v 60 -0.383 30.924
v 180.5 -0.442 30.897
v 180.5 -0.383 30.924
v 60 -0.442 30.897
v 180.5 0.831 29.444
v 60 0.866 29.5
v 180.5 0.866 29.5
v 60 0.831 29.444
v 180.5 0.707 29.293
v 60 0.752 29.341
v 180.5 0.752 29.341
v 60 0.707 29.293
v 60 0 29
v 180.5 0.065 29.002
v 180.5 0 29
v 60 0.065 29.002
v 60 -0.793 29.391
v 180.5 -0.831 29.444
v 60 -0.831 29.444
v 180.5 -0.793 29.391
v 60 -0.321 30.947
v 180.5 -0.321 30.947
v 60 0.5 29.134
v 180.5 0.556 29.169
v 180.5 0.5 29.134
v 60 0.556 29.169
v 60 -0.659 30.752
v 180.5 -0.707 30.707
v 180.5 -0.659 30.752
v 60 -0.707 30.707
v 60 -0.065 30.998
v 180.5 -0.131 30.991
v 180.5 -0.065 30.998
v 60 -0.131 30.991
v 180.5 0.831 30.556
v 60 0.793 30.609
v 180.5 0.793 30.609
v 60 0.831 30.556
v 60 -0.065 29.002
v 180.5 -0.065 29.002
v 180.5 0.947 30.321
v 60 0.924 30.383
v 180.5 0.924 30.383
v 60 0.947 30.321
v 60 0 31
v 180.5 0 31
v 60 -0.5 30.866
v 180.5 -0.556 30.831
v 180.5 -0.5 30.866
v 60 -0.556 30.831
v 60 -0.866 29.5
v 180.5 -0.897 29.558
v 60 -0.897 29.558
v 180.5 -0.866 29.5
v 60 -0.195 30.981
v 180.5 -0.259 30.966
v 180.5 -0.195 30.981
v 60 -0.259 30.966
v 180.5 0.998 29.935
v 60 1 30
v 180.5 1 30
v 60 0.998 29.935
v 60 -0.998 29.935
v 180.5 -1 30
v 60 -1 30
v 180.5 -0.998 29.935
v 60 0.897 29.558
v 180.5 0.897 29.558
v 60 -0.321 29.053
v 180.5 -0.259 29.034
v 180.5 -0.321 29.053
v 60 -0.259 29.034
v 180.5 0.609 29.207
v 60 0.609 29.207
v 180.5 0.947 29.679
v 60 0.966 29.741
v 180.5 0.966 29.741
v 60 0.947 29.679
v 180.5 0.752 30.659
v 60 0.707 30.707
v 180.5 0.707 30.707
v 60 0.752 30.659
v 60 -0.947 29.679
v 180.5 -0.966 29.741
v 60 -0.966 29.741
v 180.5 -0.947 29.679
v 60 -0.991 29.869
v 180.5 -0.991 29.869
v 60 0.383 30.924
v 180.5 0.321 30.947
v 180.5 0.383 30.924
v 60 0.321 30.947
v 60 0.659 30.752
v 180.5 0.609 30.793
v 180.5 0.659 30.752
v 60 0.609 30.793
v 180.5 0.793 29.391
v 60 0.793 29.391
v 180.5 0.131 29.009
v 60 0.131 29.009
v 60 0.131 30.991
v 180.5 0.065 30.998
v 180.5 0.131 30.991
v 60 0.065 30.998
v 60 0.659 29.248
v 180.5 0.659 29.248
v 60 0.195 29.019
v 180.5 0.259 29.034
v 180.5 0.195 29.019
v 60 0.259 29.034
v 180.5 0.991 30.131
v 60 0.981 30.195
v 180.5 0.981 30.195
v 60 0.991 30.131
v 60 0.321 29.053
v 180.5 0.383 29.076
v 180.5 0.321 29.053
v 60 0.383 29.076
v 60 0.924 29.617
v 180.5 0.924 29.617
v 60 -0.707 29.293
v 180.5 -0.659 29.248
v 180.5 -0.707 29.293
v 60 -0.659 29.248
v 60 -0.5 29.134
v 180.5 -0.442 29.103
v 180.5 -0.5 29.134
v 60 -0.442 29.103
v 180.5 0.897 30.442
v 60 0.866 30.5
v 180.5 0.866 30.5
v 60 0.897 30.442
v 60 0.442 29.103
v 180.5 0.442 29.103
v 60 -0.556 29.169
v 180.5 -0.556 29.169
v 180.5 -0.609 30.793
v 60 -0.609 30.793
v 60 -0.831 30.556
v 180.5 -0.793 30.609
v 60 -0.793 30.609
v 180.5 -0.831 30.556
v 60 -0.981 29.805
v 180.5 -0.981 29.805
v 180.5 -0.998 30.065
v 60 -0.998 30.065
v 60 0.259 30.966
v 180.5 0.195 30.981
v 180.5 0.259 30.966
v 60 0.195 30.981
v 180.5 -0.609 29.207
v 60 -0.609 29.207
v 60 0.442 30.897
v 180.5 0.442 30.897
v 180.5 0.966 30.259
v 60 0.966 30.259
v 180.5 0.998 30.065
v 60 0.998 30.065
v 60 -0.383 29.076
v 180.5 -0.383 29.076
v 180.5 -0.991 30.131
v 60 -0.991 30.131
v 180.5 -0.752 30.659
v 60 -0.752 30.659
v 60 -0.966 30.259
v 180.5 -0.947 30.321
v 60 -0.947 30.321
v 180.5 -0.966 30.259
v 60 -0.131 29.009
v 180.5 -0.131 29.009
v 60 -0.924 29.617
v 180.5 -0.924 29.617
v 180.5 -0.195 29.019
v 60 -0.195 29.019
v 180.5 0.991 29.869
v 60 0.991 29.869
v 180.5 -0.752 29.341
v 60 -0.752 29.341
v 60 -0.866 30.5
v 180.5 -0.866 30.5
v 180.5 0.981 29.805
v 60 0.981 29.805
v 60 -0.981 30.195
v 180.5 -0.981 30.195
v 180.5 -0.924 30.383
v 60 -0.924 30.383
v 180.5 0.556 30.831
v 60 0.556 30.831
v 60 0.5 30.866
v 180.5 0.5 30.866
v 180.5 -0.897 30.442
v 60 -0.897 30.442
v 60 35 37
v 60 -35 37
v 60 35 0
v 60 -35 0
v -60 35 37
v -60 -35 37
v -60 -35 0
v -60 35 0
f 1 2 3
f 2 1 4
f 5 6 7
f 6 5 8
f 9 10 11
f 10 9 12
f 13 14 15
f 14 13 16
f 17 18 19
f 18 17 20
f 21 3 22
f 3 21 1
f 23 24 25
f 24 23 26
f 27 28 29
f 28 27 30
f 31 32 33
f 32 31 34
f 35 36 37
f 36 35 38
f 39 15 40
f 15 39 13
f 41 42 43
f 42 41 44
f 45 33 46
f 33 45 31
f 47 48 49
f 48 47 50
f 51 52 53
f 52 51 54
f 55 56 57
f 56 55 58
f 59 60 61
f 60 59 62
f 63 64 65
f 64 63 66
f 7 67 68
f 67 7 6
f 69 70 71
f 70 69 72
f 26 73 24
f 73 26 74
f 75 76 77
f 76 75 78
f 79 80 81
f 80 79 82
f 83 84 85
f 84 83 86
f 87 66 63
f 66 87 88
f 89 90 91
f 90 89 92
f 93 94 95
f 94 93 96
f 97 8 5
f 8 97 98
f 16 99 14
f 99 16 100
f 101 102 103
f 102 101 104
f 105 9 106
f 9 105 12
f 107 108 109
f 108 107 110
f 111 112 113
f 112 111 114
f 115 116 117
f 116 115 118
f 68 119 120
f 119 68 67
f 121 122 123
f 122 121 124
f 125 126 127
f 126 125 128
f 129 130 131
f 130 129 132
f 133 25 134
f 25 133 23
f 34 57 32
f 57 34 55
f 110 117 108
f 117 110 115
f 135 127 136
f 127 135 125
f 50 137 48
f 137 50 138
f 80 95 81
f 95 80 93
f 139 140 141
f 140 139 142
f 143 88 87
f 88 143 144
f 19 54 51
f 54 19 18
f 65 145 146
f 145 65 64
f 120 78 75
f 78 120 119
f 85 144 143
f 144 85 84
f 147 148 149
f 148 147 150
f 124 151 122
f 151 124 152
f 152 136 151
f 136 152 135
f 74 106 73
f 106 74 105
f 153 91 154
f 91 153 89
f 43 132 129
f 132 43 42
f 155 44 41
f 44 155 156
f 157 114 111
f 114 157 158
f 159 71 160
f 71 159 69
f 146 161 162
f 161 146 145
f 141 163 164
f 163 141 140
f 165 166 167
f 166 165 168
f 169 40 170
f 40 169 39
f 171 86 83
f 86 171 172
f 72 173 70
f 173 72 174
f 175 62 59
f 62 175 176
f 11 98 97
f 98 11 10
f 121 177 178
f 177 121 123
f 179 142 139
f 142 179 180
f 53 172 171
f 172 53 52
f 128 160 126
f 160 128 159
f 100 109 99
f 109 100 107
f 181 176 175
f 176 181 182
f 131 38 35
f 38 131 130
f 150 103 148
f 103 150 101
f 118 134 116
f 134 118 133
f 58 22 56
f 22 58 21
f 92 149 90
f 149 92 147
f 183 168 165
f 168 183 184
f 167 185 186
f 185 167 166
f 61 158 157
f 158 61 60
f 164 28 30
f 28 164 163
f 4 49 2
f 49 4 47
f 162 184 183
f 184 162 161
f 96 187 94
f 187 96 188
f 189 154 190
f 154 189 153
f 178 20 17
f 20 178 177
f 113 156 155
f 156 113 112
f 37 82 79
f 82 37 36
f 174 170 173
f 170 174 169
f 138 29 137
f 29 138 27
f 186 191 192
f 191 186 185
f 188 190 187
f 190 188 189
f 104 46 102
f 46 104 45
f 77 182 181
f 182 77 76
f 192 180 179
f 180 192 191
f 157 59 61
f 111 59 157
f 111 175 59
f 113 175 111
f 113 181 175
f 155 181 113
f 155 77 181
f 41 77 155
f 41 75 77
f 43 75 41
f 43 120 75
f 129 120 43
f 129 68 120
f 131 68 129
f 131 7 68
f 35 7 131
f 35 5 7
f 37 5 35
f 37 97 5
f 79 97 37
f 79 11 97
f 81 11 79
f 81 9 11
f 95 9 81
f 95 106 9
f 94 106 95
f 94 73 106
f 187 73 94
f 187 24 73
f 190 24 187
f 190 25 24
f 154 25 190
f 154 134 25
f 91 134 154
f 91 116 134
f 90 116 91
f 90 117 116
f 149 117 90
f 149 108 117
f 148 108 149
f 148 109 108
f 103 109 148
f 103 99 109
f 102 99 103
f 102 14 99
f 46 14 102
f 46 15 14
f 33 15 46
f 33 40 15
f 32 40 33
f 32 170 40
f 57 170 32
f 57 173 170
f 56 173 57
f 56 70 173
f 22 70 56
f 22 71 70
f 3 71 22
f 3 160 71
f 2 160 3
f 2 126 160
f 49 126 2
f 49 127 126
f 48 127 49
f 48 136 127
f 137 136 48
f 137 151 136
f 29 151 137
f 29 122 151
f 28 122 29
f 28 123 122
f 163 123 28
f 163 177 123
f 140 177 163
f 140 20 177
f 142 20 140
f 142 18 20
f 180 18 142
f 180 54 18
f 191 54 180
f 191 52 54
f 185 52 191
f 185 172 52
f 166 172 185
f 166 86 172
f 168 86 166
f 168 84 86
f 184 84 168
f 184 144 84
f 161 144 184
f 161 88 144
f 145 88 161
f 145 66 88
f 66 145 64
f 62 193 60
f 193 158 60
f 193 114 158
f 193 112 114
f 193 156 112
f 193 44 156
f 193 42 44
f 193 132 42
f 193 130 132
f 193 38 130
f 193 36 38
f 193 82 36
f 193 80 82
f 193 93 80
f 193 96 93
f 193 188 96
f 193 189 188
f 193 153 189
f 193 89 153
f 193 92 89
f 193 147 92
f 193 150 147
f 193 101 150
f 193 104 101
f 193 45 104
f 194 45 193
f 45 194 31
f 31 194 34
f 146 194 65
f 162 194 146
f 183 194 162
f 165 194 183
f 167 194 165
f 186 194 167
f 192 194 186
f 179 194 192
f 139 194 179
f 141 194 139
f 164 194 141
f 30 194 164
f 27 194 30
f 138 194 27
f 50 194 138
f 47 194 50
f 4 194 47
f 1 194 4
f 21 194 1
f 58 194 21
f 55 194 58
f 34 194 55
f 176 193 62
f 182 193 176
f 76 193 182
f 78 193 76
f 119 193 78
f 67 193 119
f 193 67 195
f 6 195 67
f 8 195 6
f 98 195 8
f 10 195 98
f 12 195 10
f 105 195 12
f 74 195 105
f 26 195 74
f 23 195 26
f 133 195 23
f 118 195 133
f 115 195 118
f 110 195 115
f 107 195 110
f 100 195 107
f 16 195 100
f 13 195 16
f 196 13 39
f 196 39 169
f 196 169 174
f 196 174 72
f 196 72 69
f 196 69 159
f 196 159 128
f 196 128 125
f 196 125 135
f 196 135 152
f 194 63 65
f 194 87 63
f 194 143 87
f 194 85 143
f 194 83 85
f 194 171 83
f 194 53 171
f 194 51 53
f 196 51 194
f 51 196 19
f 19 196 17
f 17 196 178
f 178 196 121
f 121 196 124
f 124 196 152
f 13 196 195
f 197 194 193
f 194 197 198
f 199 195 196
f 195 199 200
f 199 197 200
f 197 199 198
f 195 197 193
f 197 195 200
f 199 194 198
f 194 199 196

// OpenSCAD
// Mini horizontal gel-electrophoresis box - buffer tank
// Print orientation: tank rests on XY plane (z = 0), builds upward (+Z)

// ---------------- Parameters ----------------
outer_x   = 120;   // outer length in X (mm)
outer_y   = 70;    // outer width in Y (mm)
outer_z   = 40;    // outer height in Z (mm)

wall      = 3;     // wall thickness (mm)
floor     = 3;     // floor thickness (mm)

platform_x = 60;   // platform length in X (mm), centred
platform_top_z = 13; // height of platform top above inner floor (mm)

hole_d    = 2;     // electrode hole diameter (mm)
hole_y    = 0;     // hole centre Y position (mm)
hole_z    = 30;    // hole centre Z position (mm)

eps       = 0.5;   // cutter overshoot past faces (mm)
$fn       = 96;    // curve resolution

// ---------------- Derived ----------------
inner_x = outer_x - 2*wall;   // 114 mm
inner_y = outer_y - 2*wall;   // 64 mm
inner_floor_z = floor;        // 3 mm (inner floor lies on z = floor)

platform_bottom_z = inner_floor_z;        // platform bottom at inner floor level
// platform height = platform_top_z - inner_floor_z = 10 mm

// ---------------- Model ----------------
union() {
    // Main tank body (open top)
    translate([-outer_x/2, -outer_y/2, 0])
        cube([outer_x, outer_y, outer_z - floor]);

    // Raised gel-tray platform, centred in X, spanning full Y
    translate([-outer_x/2, -outer_y/2, platform_bottom_z])
        cube([platform_x, outer_y, platform_top_z - inner_floor_z]);

    // Electrode holes through each end wall, along X
    for (sx = [-1, 1])
        translate([sx > 0 ? outer_x/2 - eps : -outer_x/2 + eps, hole_y, hole_z])
            rotate([0, 90, 0])
                cylinder(d = hole_d, h = outer_x + 2*eps);
}
